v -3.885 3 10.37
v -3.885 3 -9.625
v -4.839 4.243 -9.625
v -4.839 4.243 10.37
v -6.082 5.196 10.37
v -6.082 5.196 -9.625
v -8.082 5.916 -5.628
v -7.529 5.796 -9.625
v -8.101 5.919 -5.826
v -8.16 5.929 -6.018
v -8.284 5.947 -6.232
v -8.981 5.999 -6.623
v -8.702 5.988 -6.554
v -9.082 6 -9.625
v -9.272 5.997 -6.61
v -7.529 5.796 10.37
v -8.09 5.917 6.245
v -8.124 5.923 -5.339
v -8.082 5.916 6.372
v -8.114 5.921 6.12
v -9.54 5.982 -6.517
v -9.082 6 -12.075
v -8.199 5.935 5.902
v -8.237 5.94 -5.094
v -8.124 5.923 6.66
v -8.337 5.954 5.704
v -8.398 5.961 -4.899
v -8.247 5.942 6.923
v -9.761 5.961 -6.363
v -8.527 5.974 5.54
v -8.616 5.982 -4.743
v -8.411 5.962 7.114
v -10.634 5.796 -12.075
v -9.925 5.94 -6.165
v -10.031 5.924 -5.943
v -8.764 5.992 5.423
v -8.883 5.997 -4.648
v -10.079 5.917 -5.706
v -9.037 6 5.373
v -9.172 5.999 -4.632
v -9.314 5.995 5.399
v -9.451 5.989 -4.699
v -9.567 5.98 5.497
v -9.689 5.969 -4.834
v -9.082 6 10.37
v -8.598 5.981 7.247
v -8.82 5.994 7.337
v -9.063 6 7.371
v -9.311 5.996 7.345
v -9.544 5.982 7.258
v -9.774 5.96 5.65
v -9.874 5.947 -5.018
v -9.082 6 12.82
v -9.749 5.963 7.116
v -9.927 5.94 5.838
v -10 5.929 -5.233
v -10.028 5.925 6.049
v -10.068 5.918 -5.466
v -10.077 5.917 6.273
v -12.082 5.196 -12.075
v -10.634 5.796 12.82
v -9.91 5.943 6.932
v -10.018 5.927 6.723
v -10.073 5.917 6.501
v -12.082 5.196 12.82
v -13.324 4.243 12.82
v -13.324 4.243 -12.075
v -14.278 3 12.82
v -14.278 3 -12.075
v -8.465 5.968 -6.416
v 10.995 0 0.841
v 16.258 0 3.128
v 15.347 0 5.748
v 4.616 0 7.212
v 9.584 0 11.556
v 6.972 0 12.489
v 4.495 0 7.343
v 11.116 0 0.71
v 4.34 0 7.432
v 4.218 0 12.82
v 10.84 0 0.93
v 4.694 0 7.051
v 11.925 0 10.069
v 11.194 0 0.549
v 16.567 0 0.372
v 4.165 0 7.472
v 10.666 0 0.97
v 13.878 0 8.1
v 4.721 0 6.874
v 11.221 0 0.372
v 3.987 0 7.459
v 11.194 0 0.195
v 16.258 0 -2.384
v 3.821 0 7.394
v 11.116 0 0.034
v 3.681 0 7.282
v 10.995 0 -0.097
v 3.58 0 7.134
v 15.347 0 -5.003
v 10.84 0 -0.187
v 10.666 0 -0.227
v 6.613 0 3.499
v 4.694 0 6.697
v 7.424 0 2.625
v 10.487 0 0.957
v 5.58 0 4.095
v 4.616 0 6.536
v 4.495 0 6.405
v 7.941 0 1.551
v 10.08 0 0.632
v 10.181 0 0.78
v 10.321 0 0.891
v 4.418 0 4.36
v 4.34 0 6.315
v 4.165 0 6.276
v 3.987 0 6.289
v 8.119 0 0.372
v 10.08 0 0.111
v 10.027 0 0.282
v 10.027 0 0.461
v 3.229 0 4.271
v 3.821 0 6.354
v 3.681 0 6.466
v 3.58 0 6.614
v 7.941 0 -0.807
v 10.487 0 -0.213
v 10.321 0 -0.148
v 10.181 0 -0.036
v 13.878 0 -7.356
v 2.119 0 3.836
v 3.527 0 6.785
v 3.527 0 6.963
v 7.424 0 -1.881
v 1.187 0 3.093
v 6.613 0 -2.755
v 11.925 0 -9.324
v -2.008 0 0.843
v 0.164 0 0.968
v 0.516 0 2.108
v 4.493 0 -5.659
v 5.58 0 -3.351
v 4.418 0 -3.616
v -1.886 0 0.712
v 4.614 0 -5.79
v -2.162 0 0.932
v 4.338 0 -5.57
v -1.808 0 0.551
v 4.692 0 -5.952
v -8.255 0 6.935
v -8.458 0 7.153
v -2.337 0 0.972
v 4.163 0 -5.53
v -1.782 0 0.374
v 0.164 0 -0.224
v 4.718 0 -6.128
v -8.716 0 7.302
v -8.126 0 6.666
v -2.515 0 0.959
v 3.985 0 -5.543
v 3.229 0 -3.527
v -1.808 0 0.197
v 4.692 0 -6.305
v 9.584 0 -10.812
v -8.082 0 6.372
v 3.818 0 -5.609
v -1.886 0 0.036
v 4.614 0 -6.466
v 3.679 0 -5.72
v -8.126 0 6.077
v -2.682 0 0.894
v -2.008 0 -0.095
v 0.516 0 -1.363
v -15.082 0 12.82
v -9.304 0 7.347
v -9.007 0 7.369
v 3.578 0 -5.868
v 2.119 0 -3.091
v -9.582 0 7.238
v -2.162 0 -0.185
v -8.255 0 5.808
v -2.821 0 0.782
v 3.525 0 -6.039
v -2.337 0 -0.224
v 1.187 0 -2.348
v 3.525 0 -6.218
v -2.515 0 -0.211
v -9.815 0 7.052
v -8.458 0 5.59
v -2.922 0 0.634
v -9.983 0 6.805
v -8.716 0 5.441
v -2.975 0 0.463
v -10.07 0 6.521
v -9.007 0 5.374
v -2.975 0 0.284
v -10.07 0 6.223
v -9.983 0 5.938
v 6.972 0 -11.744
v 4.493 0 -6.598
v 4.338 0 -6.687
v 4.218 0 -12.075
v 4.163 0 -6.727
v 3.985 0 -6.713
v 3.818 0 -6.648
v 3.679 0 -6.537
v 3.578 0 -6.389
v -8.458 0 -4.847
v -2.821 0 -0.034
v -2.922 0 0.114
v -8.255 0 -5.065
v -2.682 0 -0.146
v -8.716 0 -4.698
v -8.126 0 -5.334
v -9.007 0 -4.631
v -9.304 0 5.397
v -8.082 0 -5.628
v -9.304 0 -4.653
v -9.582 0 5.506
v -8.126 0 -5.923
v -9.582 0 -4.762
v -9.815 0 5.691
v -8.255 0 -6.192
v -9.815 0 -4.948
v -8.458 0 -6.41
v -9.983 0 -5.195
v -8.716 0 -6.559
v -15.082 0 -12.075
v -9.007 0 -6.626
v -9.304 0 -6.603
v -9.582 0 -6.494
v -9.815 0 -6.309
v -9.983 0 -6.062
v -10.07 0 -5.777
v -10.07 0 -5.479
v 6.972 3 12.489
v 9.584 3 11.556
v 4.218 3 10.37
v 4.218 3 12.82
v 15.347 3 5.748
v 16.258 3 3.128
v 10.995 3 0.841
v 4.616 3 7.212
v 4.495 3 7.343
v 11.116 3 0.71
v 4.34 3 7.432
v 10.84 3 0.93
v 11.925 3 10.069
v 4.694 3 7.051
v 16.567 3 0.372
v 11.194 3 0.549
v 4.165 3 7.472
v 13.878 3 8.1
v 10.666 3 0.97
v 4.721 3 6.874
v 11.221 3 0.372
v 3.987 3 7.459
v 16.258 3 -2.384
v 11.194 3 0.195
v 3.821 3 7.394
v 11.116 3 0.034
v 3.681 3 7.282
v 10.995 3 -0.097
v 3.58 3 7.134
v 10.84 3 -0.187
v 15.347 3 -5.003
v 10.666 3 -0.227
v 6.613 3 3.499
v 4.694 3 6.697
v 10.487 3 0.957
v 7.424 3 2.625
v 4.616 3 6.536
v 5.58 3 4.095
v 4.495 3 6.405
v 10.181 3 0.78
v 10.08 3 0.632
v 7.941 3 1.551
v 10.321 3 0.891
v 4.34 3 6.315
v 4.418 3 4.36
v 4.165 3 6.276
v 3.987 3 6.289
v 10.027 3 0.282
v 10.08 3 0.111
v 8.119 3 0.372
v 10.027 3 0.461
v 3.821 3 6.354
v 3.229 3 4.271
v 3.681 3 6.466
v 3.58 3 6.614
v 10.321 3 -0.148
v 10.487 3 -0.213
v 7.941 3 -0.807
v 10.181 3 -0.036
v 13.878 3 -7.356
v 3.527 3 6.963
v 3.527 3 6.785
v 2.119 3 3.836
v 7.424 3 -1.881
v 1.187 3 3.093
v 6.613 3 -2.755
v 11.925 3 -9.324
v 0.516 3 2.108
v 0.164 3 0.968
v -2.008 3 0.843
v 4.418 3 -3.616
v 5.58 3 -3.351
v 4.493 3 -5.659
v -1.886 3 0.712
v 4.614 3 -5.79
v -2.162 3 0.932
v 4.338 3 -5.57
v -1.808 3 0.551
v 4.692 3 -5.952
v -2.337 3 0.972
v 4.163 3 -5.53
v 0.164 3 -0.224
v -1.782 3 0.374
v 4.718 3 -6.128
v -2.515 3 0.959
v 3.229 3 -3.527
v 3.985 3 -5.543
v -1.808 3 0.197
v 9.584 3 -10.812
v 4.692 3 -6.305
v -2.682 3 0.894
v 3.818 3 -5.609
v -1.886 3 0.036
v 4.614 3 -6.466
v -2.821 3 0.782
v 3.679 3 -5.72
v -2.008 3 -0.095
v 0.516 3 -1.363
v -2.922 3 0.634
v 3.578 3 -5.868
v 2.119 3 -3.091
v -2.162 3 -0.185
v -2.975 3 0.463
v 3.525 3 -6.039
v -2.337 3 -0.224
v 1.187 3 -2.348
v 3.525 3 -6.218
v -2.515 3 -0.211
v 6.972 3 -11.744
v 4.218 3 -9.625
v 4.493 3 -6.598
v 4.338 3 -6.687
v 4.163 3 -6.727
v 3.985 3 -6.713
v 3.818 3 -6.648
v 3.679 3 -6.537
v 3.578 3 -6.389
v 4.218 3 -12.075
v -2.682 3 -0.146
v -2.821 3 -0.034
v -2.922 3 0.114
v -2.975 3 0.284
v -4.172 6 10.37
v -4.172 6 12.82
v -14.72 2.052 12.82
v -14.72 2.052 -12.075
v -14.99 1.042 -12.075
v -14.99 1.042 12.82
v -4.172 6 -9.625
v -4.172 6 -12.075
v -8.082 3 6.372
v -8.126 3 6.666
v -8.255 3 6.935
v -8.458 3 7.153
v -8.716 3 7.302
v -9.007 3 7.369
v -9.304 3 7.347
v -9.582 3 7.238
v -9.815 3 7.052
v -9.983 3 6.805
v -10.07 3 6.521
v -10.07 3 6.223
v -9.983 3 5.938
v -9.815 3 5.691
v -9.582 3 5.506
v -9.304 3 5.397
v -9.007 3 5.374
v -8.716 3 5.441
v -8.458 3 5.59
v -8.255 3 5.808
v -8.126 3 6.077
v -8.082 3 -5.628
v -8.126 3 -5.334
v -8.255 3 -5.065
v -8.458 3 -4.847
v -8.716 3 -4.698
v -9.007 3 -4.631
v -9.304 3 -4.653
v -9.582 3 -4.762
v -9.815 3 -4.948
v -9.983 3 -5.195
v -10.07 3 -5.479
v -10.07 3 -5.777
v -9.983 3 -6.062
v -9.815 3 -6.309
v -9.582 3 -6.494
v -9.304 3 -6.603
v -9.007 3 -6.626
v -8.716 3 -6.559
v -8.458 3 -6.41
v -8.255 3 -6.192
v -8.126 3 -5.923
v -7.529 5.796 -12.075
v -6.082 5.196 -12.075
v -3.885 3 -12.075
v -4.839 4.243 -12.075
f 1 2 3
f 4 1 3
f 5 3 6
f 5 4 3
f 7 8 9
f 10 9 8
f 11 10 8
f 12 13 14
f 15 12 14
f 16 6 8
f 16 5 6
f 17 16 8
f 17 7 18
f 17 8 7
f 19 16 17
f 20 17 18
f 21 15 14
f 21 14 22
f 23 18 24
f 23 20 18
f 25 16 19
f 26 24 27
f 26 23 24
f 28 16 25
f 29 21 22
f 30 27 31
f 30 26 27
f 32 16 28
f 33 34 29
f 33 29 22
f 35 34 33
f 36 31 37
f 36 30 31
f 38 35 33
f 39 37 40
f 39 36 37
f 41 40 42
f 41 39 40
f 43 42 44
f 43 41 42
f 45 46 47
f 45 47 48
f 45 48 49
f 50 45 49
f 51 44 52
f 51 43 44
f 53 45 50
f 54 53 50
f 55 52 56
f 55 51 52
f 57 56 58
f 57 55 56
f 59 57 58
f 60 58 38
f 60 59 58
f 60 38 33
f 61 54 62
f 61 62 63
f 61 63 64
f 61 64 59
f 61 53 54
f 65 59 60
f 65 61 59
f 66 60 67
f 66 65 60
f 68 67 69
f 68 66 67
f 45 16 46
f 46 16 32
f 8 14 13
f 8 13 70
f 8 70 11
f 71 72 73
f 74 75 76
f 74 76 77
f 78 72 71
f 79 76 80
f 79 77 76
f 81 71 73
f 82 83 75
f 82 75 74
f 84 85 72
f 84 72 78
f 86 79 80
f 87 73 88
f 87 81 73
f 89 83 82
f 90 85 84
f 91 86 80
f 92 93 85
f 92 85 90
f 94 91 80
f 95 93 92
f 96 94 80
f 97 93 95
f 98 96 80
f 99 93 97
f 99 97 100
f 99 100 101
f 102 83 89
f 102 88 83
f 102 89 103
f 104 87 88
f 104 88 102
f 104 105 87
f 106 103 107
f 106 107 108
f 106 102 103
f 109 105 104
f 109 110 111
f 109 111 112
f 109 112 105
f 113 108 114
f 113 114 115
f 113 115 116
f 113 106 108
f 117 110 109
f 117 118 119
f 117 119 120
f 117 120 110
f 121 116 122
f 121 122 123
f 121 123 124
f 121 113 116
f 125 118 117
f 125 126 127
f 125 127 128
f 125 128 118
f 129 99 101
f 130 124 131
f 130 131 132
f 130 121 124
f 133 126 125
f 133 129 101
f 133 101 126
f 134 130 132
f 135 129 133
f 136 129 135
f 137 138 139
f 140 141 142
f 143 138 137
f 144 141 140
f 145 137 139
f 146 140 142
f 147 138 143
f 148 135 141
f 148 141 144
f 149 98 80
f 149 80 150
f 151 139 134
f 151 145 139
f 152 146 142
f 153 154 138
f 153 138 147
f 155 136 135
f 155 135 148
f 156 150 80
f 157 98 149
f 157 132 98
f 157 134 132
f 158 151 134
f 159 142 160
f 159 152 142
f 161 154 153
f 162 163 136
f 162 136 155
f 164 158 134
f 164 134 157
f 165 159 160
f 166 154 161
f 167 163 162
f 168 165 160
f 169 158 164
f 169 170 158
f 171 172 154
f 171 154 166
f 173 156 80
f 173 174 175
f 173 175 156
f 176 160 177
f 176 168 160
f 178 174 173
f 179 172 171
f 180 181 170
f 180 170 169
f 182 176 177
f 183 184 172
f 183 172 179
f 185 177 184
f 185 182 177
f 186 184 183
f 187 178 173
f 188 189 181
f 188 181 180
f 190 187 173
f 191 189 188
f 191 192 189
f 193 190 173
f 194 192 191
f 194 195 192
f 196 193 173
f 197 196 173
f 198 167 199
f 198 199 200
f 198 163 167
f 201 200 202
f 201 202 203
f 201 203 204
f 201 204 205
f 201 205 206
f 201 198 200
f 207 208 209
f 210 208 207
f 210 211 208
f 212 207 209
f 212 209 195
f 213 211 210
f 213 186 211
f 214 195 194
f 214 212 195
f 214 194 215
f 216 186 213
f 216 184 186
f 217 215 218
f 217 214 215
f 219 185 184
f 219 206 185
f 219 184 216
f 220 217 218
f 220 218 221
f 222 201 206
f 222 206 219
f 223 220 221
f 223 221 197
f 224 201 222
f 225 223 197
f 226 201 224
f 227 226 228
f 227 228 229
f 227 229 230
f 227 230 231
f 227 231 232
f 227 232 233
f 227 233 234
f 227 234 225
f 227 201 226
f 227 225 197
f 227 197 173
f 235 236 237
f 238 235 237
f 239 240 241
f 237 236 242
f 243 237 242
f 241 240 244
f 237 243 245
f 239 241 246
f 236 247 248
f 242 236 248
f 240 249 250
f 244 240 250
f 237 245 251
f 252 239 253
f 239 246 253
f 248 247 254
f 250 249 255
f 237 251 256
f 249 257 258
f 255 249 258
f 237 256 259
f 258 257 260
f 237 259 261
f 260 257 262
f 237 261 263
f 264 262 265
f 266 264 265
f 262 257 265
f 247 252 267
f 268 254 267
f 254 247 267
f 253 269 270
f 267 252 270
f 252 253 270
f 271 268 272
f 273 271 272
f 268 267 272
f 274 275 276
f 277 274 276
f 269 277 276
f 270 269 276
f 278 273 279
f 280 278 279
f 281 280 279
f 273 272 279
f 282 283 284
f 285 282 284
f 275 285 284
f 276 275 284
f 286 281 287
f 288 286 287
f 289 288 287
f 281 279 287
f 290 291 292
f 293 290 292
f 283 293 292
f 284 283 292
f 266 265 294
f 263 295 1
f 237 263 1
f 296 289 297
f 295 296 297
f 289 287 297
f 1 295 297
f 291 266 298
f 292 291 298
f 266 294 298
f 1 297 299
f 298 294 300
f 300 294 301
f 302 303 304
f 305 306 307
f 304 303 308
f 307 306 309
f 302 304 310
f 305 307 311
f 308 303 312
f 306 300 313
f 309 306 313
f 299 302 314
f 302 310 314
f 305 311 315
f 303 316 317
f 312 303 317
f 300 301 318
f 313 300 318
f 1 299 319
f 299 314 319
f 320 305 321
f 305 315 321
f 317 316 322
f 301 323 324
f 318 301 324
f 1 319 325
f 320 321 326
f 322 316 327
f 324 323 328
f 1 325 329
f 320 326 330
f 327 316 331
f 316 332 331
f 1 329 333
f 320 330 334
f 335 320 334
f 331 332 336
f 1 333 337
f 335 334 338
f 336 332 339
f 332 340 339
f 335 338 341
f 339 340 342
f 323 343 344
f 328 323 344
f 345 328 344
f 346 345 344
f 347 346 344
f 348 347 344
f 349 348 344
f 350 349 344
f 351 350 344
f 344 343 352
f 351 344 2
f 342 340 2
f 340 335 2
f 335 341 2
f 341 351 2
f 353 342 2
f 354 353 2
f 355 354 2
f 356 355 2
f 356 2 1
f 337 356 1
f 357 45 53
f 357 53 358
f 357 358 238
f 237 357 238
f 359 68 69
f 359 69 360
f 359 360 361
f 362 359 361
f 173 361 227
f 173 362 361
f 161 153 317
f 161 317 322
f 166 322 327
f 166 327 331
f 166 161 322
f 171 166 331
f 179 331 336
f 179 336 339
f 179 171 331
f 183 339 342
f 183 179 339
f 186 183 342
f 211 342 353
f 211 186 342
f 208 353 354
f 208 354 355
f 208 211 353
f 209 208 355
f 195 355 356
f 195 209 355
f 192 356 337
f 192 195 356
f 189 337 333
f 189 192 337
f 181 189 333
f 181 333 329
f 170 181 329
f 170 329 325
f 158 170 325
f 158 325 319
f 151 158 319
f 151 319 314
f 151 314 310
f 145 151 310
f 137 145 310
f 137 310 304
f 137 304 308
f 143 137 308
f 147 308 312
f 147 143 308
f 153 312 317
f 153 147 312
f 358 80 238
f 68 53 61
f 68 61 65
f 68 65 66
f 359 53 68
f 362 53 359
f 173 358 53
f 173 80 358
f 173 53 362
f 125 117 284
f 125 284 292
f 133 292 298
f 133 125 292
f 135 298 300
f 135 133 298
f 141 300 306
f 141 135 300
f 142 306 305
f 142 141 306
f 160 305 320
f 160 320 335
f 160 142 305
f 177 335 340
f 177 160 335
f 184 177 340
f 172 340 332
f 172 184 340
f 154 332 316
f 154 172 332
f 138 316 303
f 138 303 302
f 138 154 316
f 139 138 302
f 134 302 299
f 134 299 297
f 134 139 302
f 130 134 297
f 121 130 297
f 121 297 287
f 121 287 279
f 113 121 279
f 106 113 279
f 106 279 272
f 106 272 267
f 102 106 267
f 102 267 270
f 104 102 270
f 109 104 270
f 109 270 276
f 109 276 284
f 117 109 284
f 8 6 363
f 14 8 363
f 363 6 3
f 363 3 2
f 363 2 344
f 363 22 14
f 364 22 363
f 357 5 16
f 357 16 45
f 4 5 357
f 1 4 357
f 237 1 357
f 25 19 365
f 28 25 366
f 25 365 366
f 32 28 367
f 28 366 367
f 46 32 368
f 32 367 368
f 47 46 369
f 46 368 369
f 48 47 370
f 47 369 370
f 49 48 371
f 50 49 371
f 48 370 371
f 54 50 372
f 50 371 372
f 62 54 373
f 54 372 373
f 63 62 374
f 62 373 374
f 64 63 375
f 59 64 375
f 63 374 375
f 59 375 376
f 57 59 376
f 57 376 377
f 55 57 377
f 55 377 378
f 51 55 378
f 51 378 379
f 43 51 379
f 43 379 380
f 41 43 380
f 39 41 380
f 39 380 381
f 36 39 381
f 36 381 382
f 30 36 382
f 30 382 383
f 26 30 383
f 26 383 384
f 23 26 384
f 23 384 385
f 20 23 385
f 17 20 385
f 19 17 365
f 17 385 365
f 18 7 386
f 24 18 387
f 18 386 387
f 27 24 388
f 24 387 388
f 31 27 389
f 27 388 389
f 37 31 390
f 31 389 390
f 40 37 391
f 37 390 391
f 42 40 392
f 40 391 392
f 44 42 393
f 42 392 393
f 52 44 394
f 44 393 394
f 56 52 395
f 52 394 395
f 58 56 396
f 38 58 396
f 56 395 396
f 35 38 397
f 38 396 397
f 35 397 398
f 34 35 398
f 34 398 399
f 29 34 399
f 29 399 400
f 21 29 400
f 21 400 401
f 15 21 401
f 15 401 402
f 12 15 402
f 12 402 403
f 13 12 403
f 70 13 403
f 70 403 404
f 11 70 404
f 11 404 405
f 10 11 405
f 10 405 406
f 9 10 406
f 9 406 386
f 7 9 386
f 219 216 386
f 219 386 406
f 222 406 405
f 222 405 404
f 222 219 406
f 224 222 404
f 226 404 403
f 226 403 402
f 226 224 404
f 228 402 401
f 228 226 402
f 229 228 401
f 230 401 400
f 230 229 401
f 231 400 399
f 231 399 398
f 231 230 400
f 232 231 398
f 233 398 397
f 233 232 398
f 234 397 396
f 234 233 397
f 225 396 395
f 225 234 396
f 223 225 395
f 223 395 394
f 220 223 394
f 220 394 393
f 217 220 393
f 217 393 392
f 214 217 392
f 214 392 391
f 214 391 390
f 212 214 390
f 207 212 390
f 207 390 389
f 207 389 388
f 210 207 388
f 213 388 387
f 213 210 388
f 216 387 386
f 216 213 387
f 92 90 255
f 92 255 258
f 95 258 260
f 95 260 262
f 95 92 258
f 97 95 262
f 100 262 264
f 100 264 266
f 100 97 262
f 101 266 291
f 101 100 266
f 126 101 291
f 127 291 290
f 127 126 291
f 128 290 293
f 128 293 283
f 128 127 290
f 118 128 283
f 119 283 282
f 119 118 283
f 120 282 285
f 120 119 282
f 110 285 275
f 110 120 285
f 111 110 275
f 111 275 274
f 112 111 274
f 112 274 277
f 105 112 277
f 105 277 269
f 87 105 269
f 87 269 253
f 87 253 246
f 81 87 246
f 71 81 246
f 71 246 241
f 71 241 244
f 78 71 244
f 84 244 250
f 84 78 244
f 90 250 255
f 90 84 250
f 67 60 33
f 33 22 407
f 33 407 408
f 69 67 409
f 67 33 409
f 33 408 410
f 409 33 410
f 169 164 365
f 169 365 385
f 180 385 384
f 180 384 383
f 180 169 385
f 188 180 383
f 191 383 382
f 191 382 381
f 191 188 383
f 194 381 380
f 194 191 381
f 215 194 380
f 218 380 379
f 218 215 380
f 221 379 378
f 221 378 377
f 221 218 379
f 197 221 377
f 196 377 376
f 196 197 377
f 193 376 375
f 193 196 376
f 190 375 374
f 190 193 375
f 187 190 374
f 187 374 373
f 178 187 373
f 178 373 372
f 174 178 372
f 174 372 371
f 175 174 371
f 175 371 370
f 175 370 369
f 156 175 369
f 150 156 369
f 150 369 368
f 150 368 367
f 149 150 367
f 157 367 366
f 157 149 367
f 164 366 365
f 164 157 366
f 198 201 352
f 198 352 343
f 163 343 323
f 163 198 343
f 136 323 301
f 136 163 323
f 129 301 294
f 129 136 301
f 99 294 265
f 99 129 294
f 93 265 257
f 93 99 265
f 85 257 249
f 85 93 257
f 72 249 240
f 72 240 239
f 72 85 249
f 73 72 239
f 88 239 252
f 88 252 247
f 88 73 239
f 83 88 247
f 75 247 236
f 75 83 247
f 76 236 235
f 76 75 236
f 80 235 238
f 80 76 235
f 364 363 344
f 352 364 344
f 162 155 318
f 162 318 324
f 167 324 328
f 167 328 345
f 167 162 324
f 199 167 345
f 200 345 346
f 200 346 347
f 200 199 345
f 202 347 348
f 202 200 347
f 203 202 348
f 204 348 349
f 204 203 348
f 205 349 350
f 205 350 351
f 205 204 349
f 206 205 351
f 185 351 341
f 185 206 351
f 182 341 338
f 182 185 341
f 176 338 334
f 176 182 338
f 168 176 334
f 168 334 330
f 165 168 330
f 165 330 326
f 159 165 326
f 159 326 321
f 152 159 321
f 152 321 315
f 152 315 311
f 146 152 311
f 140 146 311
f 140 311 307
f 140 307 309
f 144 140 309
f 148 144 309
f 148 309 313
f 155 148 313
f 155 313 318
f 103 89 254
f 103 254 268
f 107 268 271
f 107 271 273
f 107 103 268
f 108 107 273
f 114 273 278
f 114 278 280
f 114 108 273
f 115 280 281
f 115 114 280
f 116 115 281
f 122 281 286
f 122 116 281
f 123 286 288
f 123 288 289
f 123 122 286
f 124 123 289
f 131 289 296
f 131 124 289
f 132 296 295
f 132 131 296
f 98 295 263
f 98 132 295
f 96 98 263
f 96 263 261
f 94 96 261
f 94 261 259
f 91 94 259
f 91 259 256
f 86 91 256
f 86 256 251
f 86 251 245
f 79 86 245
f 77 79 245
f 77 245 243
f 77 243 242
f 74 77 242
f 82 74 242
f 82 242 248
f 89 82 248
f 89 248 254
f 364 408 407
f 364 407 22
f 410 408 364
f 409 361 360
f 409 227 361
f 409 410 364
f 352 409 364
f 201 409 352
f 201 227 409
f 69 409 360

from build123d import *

# Parameters (mm, degrees)
CROQUIS1_R              = 0.599999868
CROQUIS1_R_2            = 3.999426158
CROQUIS1_R_3            = 1.000000121
CROQUIS1_R_4            = 1.000000477
SALIENTE_EXTRUIR1_DEPTH = 3
SALIENTE_EXTRUIR2_DEPTH = 24.89496
CROQUIS3_W              = 13.299999714
CROQUIS3_H              = 2.45
SALIENTE_EXTRUIR3_DEPTH = 3
CORTAR_EXTRUIR1_DEPTH   = 24.89496
CROQUIS5_R              = 1.000000121
CROQUIS5_R_2            = 1.000000477
CORTAR_EXTRUIR2_DEPTH   = 11


with BuildPart() as part:
    # Croquis1 → Saliente-Extruir1 (new body)
    with BuildSketch(Plane(origin=(0, 0, 0), x_dir=(1, 0, 0), z_dir=(0, 1, 0))):
        with BuildLine():
            Line((4.218422555, -12.81969876), (-15.081577159, -12.81969876))
            Line((-15.081577159, -12.81969876), (-15.081577159, 12.075260967))
            Line((-15.081577159, 12.075260967), (4.218422555, 12.075260967))
            ThreePointArc((4.218422555, 12.075260967), (16.567050884, -0.372218896), (4.218422555, -12.81969876))
        make_face()
        with Locations((4.118422395, 6.128403493)):
            Circle(CROQUIS1_R, mode=Mode.SUBTRACT)
        with Locations((4.119175364, -0.372218896)):
            Circle(CROQUIS1_R_2, mode=Mode.SUBTRACT)
        with Locations((-9.081577367, 5.628403394)):
            Circle(CROQUIS1_R_3, mode=Mode.SUBTRACT)
        with Locations((-9.081576585, -6.371596672)):
            Circle(CROQUIS1_R_4, mode=Mode.SUBTRACT)
        with Locations((10.620712828, -0.371667036)):
            Circle(CROQUIS1_R, mode=Mode.SUBTRACT)
        with Locations((4.1206423, -6.873957469)):
            Circle(CROQUIS1_R, mode=Mode.SUBTRACT)
        with Locations((-2.381648134, -0.373886941)):
            Circle(CROQUIS1_R, mode=Mode.SUBTRACT)
    extrude(amount=SALIENTE_EXTRUIR1_DEPTH)

    # Croquis2 → Saliente-Extruir2 (add)
    with BuildSketch(Plane.XY.offset(12.81969876)):
        with BuildLine():
            Line((-14.277729582, 3), (-3.885424736, 3))
            ThreePointArc((-3.885424736, 3), (-9.081577159, 6), (-14.277729582, 3))
        make_face()
    extrude(amount=-SALIENTE_EXTRUIR2_DEPTH)

    # Croquis3 → Saliente-Extruir3 (add)
    with BuildSketch(Plane(origin=(0, 3, 0), x_dir=(1, 0, 0), z_dir=(0, 1, 0))):
        with Locations((-2.431577302, -11.59469876)):
            Rectangle(CROQUIS3_W, CROQUIS3_H)
        with Locations((-2.431577302, 10.850260967)):
            Rectangle(CROQUIS3_W, CROQUIS3_H)
    extrude(amount=SALIENTE_EXTRUIR3_DEPTH)

    # Croquis4 → Cortar-Extruir1 (cut)
    with BuildSketch(Plane.XY.offset(12.81969876)):
        Polygon((-4.171577445, 6), (4.218422555, 3), (4.218422555, 6), align=None)
        with BuildLine():
            Line((-15.081577159, 0), (-16.256016644, 0))
            ThreePointArc((-16.256016644, 0), (-14.36312843, 4.855697487), (-9.683294652, 7.149162047))
            Line((-9.683294652, 7.149162047), (-9.683294652, 5.969751759))
            ThreePointArc((-9.683294652, 5.969751759), (-13.53187518, 4.024282237), (-15.081577159, 0))
        make_face()
    extrude(amount=-CORTAR_EXTRUIR1_DEPTH, mode=Mode.SUBTRACT)

    # Croquis5 → Cortar-Extruir2 (cut)
    with BuildSketch(Plane.XZ):
        with Locations((-9.081577367, -5.628403394)):
            Circle(CROQUIS5_R)
        with Locations((-9.081576585, 6.371596672)):
            Circle(CROQUIS5_R_2)
    extrude(amount=-CORTAR_EXTRUIR2_DEPTH, mode=Mode.SUBTRACT)


solid = part.part
